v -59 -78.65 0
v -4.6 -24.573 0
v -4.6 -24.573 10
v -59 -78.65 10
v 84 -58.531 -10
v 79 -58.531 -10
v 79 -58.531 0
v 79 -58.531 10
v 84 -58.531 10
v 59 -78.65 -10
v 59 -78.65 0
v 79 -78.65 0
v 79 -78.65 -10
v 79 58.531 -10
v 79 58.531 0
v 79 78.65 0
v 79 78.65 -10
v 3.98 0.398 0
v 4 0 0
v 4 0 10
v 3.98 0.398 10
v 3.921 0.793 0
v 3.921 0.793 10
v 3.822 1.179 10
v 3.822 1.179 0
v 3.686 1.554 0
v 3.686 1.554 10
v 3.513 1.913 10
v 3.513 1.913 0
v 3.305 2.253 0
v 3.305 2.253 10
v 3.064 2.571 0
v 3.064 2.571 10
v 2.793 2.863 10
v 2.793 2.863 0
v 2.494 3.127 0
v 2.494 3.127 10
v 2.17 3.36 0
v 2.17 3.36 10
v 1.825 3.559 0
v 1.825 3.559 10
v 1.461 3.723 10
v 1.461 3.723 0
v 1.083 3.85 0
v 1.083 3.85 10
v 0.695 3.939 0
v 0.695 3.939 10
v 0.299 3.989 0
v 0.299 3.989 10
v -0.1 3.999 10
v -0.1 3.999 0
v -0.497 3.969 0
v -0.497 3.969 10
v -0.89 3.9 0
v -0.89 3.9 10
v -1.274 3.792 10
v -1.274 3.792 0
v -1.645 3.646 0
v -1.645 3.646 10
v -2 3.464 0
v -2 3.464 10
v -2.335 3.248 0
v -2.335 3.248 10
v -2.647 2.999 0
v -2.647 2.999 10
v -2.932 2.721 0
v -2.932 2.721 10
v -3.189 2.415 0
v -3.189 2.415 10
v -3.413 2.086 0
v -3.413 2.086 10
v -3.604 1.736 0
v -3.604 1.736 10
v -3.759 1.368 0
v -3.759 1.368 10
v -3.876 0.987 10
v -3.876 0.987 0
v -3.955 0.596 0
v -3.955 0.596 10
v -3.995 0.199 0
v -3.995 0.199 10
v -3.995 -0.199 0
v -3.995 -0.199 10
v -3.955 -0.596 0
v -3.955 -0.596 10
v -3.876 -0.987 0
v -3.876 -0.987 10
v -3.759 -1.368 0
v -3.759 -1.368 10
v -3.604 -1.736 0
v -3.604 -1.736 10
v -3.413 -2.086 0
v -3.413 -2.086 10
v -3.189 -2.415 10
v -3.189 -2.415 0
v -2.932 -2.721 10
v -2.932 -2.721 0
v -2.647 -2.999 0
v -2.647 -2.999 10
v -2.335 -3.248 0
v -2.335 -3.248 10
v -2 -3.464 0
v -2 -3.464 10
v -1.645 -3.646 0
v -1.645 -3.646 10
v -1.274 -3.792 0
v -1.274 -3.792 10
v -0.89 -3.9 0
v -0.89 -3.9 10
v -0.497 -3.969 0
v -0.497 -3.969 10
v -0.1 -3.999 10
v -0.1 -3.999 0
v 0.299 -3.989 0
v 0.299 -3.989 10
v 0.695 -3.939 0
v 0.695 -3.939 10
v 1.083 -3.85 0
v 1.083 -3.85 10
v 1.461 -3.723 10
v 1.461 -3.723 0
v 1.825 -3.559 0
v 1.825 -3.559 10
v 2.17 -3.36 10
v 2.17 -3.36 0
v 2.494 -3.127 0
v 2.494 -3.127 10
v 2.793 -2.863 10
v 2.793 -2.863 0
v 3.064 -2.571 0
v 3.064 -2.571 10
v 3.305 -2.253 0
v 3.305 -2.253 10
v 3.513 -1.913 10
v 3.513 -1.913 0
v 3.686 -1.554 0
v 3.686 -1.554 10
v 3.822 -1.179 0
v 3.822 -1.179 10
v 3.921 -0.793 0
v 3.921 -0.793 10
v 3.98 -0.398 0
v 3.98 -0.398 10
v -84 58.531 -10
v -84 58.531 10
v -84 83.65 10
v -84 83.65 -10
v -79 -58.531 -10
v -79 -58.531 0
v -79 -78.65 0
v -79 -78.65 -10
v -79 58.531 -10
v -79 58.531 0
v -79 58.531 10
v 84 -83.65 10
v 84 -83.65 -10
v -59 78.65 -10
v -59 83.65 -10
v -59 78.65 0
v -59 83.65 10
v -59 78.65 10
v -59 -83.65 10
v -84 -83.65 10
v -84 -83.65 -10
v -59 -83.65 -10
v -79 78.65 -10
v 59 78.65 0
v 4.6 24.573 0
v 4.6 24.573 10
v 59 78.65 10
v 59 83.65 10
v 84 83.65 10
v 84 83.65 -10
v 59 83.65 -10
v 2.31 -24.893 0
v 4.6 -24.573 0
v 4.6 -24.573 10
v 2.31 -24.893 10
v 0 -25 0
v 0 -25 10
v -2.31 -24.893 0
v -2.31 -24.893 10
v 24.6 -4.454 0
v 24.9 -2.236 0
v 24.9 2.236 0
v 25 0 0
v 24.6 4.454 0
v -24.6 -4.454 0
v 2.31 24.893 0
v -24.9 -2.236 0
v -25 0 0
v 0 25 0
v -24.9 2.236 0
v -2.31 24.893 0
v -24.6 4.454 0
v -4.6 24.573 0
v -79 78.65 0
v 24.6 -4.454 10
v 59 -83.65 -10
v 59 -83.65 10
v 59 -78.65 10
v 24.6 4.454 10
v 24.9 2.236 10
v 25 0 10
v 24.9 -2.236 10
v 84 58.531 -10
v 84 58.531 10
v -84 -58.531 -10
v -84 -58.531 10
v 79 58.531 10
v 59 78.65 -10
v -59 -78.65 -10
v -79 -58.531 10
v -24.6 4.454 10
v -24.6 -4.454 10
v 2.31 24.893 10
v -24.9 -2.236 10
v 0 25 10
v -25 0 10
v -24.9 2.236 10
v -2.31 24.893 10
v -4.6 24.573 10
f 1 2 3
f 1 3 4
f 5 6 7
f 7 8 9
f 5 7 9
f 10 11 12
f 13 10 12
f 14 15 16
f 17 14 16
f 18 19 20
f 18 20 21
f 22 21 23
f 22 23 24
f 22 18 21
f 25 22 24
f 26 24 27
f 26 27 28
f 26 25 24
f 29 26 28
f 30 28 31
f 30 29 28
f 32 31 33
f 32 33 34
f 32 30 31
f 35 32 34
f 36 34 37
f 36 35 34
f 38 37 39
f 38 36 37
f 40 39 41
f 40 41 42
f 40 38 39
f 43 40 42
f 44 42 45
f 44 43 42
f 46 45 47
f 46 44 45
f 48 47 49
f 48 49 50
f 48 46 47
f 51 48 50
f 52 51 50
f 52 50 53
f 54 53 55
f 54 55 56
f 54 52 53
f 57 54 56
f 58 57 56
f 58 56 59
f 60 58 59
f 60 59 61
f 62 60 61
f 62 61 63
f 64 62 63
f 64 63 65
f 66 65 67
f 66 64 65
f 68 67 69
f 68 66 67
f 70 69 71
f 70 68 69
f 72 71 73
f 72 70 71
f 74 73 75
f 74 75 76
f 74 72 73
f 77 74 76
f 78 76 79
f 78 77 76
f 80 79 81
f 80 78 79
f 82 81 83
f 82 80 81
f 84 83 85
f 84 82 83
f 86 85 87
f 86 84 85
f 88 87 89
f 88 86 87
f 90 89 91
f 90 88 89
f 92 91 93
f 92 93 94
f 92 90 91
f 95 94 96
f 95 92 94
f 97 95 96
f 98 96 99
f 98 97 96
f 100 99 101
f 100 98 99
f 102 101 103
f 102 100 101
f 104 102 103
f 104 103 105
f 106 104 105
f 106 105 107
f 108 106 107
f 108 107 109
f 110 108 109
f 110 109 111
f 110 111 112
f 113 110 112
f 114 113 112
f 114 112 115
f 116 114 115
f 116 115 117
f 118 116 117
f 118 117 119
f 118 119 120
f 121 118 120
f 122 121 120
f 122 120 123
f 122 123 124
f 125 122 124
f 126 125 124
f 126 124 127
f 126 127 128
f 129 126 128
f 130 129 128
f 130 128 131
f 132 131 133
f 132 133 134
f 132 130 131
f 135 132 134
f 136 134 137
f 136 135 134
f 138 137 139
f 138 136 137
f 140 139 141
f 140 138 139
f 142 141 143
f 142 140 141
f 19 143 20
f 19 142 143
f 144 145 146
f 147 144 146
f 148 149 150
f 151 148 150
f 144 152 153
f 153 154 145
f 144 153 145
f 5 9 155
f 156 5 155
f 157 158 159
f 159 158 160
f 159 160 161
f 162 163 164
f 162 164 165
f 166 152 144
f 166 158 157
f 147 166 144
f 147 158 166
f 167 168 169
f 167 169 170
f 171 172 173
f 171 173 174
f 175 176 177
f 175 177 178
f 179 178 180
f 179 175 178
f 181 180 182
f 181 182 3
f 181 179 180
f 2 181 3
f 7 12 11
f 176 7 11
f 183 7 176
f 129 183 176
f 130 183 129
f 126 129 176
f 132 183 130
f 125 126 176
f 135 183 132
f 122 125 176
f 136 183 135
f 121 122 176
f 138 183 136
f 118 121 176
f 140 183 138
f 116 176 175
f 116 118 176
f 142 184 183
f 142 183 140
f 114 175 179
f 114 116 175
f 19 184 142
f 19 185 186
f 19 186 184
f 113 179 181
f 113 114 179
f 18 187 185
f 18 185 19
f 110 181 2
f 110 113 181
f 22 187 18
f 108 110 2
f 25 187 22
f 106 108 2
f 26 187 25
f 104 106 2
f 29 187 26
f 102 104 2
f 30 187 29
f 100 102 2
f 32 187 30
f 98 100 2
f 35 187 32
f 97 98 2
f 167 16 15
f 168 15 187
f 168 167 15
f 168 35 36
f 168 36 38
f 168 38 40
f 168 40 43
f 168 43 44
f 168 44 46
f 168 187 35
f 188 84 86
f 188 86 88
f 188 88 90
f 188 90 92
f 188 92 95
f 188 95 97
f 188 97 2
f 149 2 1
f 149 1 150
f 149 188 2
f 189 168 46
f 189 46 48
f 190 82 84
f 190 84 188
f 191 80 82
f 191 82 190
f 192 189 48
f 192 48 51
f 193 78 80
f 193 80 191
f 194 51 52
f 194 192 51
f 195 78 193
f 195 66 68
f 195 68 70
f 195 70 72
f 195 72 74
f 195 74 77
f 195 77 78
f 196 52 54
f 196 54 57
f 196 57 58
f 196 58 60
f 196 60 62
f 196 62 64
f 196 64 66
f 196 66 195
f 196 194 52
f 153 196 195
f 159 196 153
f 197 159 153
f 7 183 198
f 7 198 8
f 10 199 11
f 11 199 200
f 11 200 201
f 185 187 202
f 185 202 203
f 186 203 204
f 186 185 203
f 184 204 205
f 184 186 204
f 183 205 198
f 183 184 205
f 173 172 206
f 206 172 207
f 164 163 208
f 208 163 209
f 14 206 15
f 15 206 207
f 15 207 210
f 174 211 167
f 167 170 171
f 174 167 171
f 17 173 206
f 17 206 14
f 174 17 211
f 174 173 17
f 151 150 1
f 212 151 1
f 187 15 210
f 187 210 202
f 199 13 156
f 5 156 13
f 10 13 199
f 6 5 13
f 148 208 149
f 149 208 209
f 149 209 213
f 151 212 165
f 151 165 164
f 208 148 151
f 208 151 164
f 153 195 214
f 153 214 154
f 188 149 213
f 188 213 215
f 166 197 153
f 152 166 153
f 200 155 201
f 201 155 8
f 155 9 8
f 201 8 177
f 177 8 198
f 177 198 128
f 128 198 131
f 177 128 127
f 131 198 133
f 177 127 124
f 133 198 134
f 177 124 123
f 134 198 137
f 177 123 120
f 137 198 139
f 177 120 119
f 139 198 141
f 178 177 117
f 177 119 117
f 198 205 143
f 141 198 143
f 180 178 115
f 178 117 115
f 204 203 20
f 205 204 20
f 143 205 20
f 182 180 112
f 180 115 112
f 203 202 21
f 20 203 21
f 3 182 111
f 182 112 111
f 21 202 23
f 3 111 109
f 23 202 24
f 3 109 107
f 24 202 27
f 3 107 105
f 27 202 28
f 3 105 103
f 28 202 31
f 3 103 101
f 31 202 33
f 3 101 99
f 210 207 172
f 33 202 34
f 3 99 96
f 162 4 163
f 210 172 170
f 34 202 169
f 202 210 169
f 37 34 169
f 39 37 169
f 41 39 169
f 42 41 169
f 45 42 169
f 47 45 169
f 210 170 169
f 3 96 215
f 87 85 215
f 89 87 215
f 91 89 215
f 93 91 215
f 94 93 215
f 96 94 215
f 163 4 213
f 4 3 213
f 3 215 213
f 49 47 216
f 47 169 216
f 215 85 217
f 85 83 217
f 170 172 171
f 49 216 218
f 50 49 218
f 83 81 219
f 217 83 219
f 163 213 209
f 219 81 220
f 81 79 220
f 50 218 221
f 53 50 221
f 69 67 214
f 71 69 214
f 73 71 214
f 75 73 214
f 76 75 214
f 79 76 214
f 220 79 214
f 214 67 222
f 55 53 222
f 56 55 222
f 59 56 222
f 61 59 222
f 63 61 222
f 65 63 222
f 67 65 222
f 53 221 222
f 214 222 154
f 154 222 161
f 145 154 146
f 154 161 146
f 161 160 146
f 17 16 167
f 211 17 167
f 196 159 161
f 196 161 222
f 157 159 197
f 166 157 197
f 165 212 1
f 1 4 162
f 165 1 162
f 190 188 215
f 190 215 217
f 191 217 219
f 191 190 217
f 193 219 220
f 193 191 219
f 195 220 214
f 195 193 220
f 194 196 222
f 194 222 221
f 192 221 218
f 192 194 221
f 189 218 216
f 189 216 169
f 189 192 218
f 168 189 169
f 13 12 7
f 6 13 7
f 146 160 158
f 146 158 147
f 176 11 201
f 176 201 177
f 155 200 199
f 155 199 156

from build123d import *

# Parameters (mm, degrees)
CROQUIS1_R              = 4
SALIENTE_EXTRUIR1_DEPTH = 10
SALIENTE_EXTRUIR2_DEPTH = 20


with BuildPart() as part:
    # Croquis1 → Saliente-Extruir1 (new body)
    with BuildSketch(Plane.XY):
        with BuildLine():
            Line((-59, 78.65), (-4.600099172, 24.573137521))
            ThreePointArc((-4.600099172, 24.573137521), (0, 25), (4.600099172, 24.573137521))
            Line((4.600099172, 24.573137521), (59, 78.65))
            Line((59, 78.65), (79, 78.65))
            Line((79, 78.65), (79, 58.530526224))
            Line((79, 58.530526224), (24.600099172, 4.453663744))
            ThreePointArc((24.600099172, 4.453663744), (25, 0), (24.600099172, -4.453663744))
            Line((24.600099172, -4.453663744), (79, -58.530526224))
            Line((79, -58.530526224), (79, -78.65))
            Line((79, -78.65), (59, -78.65))
            Line((59, -78.65), (4.600099172, -24.573137521))
            ThreePointArc((4.600099172, -24.573137521), (0, -25), (-4.600099172, -24.573137521))
            Line((-4.600099172, -24.573137521), (-59, -78.65))
            Line((-59, -78.65), (-79, -78.65))
            Line((-79, -78.65), (-79, -58.530526224))
            Line((-79, -58.530526224), (-24.600099172, -4.453663744))
            ThreePointArc((-24.600099172, -4.453663744), (-25, 0), (-24.600099172, 4.453663744))
            Line((-24.600099172, 4.453663744), (-79, 58.530526224))
            Line((-79, 58.530526224), (-79, 78.65))
            Line((-79, 78.65), (-59, 78.65))
        make_face()
        Circle(CROQUIS1_R, mode=Mode.SUBTRACT)
    extrude(amount=SALIENTE_EXTRUIR1_DEPTH)

    # Croquis4 → Saliente-Extruir2 (add)
    with BuildSketch(Plane.XY.offset(10)):
        Polygon((-59, 78.65), (-79, 78.65), (-79, 58.530526224), (-84, 58.530526224), (-84, 83.65), (-79, 83.65), (-59, 83.65), align=None)
        Polygon((59, 78.65), (59, 83.65), (79, 83.65), (84, 83.65), (84, 58.530526224), (79, 58.530526224), (79, 78.65), align=None)
        Polygon((59, -78.65), (79, -78.65), (79, -58.530526224), (84, -58.530526224), (84, -83.65), (79, -83.65), (59, -83.65), align=None)
        Polygon((-59, -78.65), (-59, -83.65), (-79, -83.65), (-84, -83.65), (-84, -58.530526224), (-79, -58.530526224), (-79, -78.65), align=None)
    extrude(amount=-SALIENTE_EXTRUIR2_DEPTH)


solid = part.part
